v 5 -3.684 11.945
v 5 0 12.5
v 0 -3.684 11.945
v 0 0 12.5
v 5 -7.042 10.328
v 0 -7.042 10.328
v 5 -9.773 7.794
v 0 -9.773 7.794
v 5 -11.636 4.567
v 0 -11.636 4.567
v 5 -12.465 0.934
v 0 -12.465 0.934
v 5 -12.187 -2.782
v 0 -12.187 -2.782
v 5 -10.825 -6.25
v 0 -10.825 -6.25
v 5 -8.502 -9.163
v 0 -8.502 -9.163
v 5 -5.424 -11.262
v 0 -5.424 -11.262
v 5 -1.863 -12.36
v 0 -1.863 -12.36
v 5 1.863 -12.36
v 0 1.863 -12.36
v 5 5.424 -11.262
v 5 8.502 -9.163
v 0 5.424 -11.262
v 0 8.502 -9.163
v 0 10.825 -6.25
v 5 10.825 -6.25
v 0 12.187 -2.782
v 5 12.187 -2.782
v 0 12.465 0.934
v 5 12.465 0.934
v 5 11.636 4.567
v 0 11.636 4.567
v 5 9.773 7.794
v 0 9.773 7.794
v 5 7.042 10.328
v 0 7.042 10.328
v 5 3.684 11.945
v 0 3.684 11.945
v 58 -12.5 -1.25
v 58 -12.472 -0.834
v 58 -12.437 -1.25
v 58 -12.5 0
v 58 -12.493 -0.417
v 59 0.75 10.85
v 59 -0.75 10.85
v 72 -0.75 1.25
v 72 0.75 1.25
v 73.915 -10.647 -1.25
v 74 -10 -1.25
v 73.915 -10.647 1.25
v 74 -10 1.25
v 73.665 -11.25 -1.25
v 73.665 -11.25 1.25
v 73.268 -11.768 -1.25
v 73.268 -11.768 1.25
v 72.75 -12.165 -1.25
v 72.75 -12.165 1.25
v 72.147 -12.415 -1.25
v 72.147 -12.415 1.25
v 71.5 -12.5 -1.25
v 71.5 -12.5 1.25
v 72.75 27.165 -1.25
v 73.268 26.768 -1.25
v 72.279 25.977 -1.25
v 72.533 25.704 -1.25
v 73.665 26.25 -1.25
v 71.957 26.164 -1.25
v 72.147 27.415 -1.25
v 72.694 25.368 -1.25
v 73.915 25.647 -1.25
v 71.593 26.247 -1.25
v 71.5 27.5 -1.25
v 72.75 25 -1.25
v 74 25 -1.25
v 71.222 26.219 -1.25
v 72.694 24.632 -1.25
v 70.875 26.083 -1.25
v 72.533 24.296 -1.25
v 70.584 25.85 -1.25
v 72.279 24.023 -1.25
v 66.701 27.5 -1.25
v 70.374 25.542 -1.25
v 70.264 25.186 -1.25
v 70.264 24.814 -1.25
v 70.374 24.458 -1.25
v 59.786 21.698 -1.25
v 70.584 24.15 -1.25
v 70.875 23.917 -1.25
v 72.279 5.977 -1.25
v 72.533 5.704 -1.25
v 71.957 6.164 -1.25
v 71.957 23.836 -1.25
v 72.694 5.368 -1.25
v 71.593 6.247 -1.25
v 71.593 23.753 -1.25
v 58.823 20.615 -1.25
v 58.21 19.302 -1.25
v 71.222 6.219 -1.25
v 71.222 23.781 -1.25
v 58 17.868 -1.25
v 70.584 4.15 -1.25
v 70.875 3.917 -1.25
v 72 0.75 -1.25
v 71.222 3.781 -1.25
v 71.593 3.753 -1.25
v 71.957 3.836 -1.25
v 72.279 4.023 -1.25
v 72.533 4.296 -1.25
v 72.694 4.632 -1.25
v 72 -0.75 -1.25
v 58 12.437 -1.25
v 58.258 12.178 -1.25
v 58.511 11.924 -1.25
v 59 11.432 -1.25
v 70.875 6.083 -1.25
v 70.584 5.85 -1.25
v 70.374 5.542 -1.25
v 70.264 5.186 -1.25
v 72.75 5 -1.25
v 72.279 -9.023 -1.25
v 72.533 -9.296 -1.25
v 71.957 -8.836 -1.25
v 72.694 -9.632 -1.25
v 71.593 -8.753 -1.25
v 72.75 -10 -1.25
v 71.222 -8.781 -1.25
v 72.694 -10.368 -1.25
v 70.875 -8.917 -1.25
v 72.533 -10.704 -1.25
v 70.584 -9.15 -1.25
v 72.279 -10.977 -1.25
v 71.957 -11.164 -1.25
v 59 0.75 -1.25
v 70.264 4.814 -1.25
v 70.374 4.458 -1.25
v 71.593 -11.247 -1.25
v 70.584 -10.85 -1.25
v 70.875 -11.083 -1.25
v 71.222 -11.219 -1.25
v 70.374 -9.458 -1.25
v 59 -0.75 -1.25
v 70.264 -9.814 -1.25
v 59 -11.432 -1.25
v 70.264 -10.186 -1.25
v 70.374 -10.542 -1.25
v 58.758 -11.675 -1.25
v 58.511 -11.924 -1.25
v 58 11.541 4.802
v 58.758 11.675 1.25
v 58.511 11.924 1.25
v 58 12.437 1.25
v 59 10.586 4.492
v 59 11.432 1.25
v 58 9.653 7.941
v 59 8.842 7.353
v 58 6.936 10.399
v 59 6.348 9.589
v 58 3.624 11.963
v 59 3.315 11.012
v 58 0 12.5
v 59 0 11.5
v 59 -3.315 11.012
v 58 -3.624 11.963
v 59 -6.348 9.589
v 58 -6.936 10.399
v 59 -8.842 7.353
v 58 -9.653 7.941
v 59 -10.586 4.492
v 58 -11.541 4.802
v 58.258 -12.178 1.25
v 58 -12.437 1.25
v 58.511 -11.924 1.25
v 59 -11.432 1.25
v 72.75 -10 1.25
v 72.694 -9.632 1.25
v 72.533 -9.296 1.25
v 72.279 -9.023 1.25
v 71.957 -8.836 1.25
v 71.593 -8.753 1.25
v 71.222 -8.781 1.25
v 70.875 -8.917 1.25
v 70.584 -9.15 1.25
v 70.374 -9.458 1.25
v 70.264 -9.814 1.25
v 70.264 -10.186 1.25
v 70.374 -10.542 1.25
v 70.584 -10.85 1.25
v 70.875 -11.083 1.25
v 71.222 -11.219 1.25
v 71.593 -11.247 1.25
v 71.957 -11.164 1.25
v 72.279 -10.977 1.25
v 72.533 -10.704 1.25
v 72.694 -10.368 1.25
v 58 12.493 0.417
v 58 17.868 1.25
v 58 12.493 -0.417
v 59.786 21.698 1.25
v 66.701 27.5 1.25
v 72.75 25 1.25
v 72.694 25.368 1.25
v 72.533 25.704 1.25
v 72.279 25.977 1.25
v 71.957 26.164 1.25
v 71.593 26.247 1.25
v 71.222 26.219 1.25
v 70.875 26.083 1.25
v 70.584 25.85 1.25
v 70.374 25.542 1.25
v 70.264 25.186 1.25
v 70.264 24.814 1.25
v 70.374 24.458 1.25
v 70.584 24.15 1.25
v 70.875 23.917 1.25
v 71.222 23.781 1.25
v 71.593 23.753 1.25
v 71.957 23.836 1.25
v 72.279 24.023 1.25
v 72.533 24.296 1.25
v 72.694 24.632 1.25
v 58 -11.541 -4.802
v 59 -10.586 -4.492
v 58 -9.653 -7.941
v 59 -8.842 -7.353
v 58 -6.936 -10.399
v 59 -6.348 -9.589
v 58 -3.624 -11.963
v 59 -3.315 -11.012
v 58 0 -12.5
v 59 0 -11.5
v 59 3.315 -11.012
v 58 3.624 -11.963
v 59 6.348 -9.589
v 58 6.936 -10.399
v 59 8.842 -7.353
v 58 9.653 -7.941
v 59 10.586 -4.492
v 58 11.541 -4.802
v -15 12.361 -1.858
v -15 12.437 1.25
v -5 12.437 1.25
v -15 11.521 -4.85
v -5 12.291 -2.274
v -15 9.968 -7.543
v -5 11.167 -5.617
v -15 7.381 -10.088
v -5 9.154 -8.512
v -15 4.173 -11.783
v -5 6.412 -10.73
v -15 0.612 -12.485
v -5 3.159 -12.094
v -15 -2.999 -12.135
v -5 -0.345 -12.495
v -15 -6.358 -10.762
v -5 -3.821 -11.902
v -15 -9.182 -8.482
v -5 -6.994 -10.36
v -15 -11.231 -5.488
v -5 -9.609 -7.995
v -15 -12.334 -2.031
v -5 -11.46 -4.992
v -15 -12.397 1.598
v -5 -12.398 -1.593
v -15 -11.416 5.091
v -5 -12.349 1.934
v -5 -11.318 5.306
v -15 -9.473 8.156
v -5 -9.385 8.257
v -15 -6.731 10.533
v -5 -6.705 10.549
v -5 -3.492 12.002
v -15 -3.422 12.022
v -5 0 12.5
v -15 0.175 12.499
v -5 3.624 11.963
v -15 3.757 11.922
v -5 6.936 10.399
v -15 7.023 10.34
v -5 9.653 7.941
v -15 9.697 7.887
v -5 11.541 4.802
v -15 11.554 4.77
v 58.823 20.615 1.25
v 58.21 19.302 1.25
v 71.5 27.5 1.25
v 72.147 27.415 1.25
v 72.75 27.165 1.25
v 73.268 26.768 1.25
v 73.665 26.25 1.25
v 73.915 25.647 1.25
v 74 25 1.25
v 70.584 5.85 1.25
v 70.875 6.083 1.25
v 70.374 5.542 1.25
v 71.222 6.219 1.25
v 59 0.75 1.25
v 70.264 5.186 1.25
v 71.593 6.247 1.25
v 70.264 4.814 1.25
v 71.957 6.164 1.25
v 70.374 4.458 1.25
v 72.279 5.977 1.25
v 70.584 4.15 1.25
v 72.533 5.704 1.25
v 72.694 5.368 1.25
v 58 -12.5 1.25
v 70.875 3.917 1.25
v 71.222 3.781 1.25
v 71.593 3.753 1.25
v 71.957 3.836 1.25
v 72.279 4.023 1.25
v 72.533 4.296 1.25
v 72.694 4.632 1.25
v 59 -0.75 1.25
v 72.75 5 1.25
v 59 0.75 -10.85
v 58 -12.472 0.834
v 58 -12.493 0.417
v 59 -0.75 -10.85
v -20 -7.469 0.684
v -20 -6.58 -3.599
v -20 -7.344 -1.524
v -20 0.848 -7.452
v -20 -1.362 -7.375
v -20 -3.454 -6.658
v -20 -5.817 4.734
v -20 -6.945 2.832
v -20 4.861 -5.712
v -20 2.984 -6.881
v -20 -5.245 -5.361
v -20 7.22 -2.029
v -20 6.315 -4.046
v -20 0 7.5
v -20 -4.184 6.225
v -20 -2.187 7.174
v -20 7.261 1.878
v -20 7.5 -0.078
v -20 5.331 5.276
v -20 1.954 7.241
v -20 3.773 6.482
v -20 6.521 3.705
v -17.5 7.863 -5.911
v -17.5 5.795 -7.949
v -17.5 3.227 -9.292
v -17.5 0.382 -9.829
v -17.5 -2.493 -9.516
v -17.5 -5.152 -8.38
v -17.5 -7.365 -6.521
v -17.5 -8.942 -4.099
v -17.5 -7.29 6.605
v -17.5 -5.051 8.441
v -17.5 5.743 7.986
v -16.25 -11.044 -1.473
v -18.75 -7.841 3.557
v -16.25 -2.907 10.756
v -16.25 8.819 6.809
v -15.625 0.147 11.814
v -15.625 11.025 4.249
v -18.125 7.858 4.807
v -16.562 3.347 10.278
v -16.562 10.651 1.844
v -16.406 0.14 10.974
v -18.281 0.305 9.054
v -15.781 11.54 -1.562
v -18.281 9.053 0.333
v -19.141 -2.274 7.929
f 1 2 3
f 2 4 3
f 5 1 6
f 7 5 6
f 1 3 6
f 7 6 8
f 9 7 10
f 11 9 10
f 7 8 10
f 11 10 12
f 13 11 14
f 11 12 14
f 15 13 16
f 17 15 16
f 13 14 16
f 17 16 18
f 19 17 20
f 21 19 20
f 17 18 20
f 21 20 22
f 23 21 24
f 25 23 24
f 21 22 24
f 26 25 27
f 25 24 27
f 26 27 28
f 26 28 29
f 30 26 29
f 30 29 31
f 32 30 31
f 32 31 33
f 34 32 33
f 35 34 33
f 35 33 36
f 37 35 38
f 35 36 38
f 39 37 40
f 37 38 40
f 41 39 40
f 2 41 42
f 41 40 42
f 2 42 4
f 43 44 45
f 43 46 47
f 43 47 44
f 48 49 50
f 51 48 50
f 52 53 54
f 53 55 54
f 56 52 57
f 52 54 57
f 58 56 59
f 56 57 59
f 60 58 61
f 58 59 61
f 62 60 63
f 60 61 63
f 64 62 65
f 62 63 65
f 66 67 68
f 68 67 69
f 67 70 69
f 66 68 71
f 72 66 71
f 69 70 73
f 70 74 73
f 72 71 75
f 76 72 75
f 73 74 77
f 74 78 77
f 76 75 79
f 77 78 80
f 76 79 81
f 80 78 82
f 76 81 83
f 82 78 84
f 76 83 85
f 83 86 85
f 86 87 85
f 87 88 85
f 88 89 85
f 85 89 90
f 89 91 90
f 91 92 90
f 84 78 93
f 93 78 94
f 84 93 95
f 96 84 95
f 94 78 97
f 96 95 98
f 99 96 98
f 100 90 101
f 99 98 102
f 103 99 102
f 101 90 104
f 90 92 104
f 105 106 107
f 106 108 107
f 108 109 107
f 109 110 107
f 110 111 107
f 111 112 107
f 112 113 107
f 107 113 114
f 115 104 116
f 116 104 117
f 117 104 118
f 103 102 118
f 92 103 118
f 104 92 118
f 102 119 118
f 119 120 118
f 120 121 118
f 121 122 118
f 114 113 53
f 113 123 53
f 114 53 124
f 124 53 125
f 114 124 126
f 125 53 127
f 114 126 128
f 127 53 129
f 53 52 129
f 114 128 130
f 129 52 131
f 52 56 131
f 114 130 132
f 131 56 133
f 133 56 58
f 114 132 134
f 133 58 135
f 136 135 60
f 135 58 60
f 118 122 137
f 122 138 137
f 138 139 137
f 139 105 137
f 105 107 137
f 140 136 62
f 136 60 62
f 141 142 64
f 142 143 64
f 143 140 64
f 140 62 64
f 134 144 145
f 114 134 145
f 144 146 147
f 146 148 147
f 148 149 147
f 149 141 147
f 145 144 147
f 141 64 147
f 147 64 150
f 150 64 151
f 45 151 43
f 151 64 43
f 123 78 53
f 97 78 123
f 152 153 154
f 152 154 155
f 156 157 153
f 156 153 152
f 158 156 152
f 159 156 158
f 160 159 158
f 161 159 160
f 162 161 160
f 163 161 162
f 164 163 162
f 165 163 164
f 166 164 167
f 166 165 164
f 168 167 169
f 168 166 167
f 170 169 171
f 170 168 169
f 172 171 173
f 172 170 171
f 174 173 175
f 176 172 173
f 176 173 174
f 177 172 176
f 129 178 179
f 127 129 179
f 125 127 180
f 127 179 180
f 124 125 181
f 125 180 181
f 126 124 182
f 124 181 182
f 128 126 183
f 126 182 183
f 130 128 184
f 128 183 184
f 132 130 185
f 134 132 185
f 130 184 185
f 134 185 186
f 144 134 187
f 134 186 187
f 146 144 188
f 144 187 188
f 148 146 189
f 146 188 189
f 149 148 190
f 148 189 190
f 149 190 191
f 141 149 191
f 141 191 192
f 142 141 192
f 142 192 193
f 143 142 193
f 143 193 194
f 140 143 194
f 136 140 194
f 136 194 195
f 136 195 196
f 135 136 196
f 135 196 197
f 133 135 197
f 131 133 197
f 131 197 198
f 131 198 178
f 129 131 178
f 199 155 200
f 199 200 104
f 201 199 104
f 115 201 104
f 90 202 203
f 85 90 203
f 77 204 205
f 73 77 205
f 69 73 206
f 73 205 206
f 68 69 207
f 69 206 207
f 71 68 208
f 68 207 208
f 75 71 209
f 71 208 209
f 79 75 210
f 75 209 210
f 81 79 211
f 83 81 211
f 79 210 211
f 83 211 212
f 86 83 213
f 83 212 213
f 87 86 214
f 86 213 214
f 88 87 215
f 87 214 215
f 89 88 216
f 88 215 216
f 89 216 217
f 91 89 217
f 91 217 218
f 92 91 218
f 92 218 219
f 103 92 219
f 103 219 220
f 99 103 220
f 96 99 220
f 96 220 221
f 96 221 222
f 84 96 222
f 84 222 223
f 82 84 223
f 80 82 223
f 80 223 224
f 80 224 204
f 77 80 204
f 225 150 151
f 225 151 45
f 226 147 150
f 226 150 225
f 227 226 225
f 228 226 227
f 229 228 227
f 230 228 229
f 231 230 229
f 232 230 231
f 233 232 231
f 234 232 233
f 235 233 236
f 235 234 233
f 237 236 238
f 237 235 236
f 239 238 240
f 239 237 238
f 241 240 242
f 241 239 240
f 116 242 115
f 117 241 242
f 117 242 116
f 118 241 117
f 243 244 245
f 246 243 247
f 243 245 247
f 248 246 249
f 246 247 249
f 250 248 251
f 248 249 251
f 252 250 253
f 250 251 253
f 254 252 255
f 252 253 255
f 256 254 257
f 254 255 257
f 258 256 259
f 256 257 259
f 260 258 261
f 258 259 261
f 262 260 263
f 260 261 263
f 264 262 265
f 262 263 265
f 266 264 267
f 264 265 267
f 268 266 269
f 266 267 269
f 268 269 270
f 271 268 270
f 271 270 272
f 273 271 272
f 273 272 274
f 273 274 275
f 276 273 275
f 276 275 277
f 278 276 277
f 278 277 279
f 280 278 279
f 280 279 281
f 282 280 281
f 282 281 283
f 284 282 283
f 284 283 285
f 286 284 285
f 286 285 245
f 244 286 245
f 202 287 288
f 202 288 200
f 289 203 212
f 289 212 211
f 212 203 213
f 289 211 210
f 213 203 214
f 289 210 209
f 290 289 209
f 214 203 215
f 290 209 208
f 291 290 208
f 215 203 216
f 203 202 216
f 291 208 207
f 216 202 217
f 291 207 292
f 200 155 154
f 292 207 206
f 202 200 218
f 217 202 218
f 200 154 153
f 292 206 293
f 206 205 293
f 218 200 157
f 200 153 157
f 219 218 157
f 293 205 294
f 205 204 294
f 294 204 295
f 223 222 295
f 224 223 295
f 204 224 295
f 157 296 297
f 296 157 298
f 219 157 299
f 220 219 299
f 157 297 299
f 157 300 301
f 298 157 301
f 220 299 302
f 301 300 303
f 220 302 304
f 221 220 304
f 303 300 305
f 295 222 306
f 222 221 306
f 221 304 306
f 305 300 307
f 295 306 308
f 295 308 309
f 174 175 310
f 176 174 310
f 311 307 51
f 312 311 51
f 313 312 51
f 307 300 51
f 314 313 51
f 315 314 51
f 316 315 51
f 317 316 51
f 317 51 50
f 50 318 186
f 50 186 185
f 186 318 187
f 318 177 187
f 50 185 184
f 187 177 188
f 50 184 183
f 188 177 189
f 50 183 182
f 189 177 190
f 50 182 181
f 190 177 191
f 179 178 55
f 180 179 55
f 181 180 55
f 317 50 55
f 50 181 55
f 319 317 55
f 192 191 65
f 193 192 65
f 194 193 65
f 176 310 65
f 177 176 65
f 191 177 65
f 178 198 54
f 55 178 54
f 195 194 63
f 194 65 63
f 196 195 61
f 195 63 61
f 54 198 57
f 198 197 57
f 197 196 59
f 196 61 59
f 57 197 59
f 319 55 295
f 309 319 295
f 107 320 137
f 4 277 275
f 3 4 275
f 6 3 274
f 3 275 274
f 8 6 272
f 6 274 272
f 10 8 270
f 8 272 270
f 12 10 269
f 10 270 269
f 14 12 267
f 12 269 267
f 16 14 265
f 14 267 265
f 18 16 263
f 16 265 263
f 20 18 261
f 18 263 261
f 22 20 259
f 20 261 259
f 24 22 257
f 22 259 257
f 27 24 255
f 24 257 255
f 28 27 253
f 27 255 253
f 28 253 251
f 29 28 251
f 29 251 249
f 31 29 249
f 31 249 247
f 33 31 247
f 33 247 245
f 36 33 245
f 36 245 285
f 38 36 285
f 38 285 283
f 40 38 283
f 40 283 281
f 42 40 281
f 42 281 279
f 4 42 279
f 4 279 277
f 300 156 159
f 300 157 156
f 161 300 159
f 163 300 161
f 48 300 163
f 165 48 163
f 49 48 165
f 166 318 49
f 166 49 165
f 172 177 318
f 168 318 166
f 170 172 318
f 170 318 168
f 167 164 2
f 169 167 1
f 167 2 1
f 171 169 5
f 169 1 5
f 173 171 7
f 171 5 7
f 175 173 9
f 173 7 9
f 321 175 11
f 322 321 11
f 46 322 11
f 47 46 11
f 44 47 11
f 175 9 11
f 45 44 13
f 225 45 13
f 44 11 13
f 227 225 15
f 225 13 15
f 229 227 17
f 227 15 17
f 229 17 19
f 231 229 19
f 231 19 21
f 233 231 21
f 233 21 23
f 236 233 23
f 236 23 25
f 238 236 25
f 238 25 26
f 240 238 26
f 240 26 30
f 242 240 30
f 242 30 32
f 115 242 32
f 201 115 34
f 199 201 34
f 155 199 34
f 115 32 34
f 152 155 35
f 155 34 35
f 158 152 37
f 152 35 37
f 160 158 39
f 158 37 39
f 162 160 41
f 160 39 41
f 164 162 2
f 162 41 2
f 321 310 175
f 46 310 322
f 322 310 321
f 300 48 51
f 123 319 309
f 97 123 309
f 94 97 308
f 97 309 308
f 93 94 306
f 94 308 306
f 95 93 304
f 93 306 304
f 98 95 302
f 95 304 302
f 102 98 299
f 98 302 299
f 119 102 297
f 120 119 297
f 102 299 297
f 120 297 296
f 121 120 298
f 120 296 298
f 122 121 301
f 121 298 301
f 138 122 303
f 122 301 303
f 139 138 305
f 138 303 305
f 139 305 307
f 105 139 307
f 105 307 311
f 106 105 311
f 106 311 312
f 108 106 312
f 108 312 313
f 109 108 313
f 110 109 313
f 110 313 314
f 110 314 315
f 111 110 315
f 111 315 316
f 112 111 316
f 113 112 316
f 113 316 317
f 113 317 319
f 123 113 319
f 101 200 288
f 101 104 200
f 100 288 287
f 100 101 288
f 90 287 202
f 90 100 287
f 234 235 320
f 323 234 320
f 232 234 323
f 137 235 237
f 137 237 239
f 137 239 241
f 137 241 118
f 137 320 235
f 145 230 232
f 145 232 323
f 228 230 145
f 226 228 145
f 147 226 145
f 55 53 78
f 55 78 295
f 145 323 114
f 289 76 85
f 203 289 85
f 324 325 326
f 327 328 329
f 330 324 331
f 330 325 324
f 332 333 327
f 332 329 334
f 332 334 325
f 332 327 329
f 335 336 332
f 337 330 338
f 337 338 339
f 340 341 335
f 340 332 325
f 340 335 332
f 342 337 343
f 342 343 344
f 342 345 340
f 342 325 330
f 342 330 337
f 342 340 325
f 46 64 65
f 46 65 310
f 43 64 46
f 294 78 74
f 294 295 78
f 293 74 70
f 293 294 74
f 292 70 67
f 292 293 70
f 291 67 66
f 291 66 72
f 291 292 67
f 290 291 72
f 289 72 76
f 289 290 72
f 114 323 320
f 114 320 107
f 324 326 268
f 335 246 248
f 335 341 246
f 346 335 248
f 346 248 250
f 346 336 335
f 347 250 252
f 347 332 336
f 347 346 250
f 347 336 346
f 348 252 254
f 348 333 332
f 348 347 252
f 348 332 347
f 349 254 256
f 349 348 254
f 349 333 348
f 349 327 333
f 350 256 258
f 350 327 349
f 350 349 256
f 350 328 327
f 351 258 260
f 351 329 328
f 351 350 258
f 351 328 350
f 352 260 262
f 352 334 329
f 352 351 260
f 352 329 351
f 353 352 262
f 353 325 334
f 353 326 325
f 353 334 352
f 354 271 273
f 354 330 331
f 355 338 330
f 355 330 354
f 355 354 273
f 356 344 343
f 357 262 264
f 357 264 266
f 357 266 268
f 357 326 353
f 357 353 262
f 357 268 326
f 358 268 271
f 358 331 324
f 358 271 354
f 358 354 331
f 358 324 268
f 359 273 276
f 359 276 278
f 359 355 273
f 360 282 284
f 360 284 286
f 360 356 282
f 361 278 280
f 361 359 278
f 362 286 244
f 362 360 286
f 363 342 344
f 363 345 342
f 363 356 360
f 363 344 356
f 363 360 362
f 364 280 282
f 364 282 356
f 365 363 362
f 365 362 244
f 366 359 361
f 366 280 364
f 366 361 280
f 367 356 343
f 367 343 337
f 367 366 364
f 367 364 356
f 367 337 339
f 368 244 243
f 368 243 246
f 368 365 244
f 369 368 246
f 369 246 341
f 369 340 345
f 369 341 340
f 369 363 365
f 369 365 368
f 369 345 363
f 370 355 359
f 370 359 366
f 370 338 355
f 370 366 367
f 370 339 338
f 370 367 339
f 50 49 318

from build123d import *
from build123d.topology import SkipClean

# Parameters (mm, degrees)
SKETCH1_R                = 12.5
BOSS_EXTRUDE1_DEPTH      = 59
SKETCH2_R                = 7.5
BOSS_EXTRUDE2_DEPTH      = 5
CHAMFER1_SIZE            = 1
BOSS_EXTRUDE3_DEPTH      = 27.5
BOSS_EXTRUDE3_DEPTH_BACK = 12.5
FILLET1_R                = 2.5
SKETCH4_R                = 1.25
CUT_EXTRUDE1_DEPTH       = 27.5
CUT_EXTRUDE2_DEPTH       = 27.5
FILLET2_R                = 5
SKETCH6_R                = 1.25
CUT_EXTRUDE3_DEPTH       = 27.5
RIB1_REACH               = 81.928
SKETCH7_WALL_W           = 178.016630936
SKETCH7_WALL_H           = 1.5
SKETCH9_R                = 12.5
BOSS_EXTRUDE5_DEPTH      = 10
SKETCH10_R               = 12.5
BOSS_EXTRUDE6_DEPTH      = 10
SKETCH11_R               = 7.5
BOSS_EXTRUDE7_DEPTH      = 5


with BuildPart() as part:
    # Sketch1 → Boss-Extrude1 (new body)
    with BuildSketch(Plane(origin=(0, 0, 0), x_dir=(0, 0, -1), z_dir=(1, 0, 0))):
        with Locations(Location((0, 0, 0), (0, 0, 180))):
            Circle(SKETCH1_R)
    extrude(amount=BOSS_EXTRUDE1_DEPTH)

    # Sketch2 → Boss-Extrude2 (add)
    with BuildSketch(Plane.ZY):
        Circle(SKETCH2_R)
    extrude(amount=BOSS_EXTRUDE2_DEPTH)

    # loft up to a face of the part (loft1)
    loft([Face(Wire([part.edges().sort_by_distance((0, 9.112107843, -8.556838824))[0]])), Face(Wire([part.edges().sort_by_distance((-5, 5.467264706, -5.134103294))[0]]))])

    # Chamfer1
    chamfer1_edges = [part.edges().sort_by_distance(p)[0] for p in [
        (59, 0, -12.5),
    ]]
    chamfer(chamfer1_edges, length=CHAMFER1_SIZE)

    # Sketch3 → Boss-Extrude3 (add, two sides: drawn at the far end of the back side and taken through both)
    with BuildSketch(Plane(origin=(0, 0, 0), x_dir=(1, 0, 0), z_dir=(0, 1, 0)).offset(-BOSS_EXTRUDE3_DEPTH_BACK)):
        Polygon((59, 1.25), (74, 1.25), (74, -1.25), (59, -1.25), (58, -1.25), (58, 1.25), align=None)
    extrude(amount=BOSS_EXTRUDE3_DEPTH + BOSS_EXTRUDE3_DEPTH_BACK)

    # Fillet1
    fillet1_edges = [part.edges().sort_by_distance(p)[0] for p in [
        (74, -12.5, 0),
        (74, 27.5, 0),
    ]]
    fillet(fillet1_edges, radius=FILLET1_R)

    # Sketch4 → Cut-Extrude1 (cut)
    with BuildSketch(Plane.XY.offset(1.25)):
        with Locations((71.5, -10)):
            Circle(SKETCH4_R)
        with Locations((71.5, 25)):
            Circle(SKETCH4_R)
    extrude(amount=-CUT_EXTRUDE1_DEPTH, mode=Mode.SUBTRACT)

    # Sketch5 → Cut-Extrude2 (cut)
    with BuildSketch(Plane.XY.offset(1.25)):
        Polygon((58, 20.199191426), (66.700764847, 27.5), (58, 27.5), align=None)
    extrude(amount=-CUT_EXTRUDE2_DEPTH, mode=Mode.SUBTRACT)

    # Fillet2
    fillet2_edges = [part.edges().sort_by_distance(p)[0] for p in [
        (58, 20.199191426, 0),
    ]]
    fillet(fillet2_edges, radius=FILLET2_R)

    # Sketch6 → Cut-Extrude3 (cut)
    with BuildSketch(Plane.XY.offset(1.25)):
        with Locations((71.5, 5)):
            Circle(SKETCH6_R)
        with Locations((71.5, -10)):
            Circle(SKETCH6_R)
    extrude(amount=-CUT_EXTRUDE3_DEPTH, mode=Mode.SUBTRACT)

    # Sketch7 wall → Rib1 (add, up to next)
    with BuildSketch(Plane(origin=(65.5, 0, 6.05), x_dir=(0.80443326696, 0, -0.594043027909), z_dir=(-0.594043027909, 0, -0.80443326696)), mode=Mode.PRIVATE) as rib1_sk1:
        Rectangle(SKETCH7_WALL_W, SKETCH7_WALL_H)
    rib1_tool1 = extrude(rib1_sk1.sketch, amount=RIB1_REACH, mode=Mode.PRIVATE) - part.part
    rib1 = rib1_tool1.solids().sort_by_distance((65.5, 0, 6.05))[0]
    add(rib1)

    # Mirror1: Rib1 across plane
    add(rib1.mirror(Plane.XY))



with BuildPart() as body_2:
    # Sketch9 → Boss-Extrude5 (new body)
    with BuildSketch(Plane.ZY.offset(5)):
        with Locations(Location((0, 0, 0), (0, 0, 84.260829523))):
            Circle(SKETCH9_R)
    extrude(amount=BOSS_EXTRUDE5_DEPTH)


with BuildPart() as part_1:
    with SkipClean():  # the faces are left unmerged after this step: merging them gives an invalid solid
        add(part.part)

        add(body_2.part)  # Boss-Extrude6 merges body 2
        # Sketch10 → Boss-Extrude6 (add)
        with BuildSketch(Plane(origin=(-5, 0, 0), x_dir=(0, 0, -1), z_dir=(1, 0, 0))):
            with Locations(Location((0, 0, 0), (0, 0, 180))):
                Circle(SKETCH10_R)
        extrude(amount=BOSS_EXTRUDE6_DEPTH)

    # Sketch11 → Boss-Extrude7 (add)
    with SkipClean():  # the faces are left unmerged after this step: merging them gives an invalid solid
        with BuildSketch(Plane.ZY.offset(15)):
            Circle(SKETCH11_R)
        extrude(amount=BOSS_EXTRUDE7_DEPTH)

    # Loft2: read off the stored shape, not the designer's step
    # Loft2: loft between two sections, ruled curve by curve
    with SkipClean():  # the faces are left unmerged after this step: merging them gives an invalid solid
        loft2_from = [
            Edge.make_bspline([(-15, 9.967693129, -7.542883646), (-15, -5.118074163, -27.478269903), (-15, -25.05346042, -12.392502611), (-15, -9.967693129, 7.542883646), (-15, 5.118074163, 27.478269903), (-15, 25.05346042, 12.392502611), (-15, 9.967693129, -7.542883646)], [0, 0, 0, 0, 0.5, 0.5, 0.5, 1, 1, 1, 1], 3, [1, 0.333333333, 0.333333333, 1, 0.333333333, 0.333333333, 1]),
        ]
        loft2_to = [
            Edge.make_bspline([(-20, 7.220329767, -2.028999276), (-20, 3.162331215, -16.469658809), (-20, -11.278328318, -12.411660258), (-20, -7.220329767, 2.028999276), (-20, -3.162331215, 16.469658809), (-20, 11.278328318, 12.411660258), (-20, 7.220329767, -2.028999276)], [0, 0, 0, 0, 0.5, 0.5, 0.5, 1, 1, 1, 1], 3, [1, 0.333333333, 0.333333333, 1, 0.333333333, 0.333333333, 1]),
        ]
        loft2 = Solid(Shell([*[Face.make_surface_from_curves(loft2_from[k], loft2_to[k]) for k in range(1)], Face(Wire(loft2_from)), Face(Wire(loft2_to))]))
        add(loft2)


solid = part_1.part
